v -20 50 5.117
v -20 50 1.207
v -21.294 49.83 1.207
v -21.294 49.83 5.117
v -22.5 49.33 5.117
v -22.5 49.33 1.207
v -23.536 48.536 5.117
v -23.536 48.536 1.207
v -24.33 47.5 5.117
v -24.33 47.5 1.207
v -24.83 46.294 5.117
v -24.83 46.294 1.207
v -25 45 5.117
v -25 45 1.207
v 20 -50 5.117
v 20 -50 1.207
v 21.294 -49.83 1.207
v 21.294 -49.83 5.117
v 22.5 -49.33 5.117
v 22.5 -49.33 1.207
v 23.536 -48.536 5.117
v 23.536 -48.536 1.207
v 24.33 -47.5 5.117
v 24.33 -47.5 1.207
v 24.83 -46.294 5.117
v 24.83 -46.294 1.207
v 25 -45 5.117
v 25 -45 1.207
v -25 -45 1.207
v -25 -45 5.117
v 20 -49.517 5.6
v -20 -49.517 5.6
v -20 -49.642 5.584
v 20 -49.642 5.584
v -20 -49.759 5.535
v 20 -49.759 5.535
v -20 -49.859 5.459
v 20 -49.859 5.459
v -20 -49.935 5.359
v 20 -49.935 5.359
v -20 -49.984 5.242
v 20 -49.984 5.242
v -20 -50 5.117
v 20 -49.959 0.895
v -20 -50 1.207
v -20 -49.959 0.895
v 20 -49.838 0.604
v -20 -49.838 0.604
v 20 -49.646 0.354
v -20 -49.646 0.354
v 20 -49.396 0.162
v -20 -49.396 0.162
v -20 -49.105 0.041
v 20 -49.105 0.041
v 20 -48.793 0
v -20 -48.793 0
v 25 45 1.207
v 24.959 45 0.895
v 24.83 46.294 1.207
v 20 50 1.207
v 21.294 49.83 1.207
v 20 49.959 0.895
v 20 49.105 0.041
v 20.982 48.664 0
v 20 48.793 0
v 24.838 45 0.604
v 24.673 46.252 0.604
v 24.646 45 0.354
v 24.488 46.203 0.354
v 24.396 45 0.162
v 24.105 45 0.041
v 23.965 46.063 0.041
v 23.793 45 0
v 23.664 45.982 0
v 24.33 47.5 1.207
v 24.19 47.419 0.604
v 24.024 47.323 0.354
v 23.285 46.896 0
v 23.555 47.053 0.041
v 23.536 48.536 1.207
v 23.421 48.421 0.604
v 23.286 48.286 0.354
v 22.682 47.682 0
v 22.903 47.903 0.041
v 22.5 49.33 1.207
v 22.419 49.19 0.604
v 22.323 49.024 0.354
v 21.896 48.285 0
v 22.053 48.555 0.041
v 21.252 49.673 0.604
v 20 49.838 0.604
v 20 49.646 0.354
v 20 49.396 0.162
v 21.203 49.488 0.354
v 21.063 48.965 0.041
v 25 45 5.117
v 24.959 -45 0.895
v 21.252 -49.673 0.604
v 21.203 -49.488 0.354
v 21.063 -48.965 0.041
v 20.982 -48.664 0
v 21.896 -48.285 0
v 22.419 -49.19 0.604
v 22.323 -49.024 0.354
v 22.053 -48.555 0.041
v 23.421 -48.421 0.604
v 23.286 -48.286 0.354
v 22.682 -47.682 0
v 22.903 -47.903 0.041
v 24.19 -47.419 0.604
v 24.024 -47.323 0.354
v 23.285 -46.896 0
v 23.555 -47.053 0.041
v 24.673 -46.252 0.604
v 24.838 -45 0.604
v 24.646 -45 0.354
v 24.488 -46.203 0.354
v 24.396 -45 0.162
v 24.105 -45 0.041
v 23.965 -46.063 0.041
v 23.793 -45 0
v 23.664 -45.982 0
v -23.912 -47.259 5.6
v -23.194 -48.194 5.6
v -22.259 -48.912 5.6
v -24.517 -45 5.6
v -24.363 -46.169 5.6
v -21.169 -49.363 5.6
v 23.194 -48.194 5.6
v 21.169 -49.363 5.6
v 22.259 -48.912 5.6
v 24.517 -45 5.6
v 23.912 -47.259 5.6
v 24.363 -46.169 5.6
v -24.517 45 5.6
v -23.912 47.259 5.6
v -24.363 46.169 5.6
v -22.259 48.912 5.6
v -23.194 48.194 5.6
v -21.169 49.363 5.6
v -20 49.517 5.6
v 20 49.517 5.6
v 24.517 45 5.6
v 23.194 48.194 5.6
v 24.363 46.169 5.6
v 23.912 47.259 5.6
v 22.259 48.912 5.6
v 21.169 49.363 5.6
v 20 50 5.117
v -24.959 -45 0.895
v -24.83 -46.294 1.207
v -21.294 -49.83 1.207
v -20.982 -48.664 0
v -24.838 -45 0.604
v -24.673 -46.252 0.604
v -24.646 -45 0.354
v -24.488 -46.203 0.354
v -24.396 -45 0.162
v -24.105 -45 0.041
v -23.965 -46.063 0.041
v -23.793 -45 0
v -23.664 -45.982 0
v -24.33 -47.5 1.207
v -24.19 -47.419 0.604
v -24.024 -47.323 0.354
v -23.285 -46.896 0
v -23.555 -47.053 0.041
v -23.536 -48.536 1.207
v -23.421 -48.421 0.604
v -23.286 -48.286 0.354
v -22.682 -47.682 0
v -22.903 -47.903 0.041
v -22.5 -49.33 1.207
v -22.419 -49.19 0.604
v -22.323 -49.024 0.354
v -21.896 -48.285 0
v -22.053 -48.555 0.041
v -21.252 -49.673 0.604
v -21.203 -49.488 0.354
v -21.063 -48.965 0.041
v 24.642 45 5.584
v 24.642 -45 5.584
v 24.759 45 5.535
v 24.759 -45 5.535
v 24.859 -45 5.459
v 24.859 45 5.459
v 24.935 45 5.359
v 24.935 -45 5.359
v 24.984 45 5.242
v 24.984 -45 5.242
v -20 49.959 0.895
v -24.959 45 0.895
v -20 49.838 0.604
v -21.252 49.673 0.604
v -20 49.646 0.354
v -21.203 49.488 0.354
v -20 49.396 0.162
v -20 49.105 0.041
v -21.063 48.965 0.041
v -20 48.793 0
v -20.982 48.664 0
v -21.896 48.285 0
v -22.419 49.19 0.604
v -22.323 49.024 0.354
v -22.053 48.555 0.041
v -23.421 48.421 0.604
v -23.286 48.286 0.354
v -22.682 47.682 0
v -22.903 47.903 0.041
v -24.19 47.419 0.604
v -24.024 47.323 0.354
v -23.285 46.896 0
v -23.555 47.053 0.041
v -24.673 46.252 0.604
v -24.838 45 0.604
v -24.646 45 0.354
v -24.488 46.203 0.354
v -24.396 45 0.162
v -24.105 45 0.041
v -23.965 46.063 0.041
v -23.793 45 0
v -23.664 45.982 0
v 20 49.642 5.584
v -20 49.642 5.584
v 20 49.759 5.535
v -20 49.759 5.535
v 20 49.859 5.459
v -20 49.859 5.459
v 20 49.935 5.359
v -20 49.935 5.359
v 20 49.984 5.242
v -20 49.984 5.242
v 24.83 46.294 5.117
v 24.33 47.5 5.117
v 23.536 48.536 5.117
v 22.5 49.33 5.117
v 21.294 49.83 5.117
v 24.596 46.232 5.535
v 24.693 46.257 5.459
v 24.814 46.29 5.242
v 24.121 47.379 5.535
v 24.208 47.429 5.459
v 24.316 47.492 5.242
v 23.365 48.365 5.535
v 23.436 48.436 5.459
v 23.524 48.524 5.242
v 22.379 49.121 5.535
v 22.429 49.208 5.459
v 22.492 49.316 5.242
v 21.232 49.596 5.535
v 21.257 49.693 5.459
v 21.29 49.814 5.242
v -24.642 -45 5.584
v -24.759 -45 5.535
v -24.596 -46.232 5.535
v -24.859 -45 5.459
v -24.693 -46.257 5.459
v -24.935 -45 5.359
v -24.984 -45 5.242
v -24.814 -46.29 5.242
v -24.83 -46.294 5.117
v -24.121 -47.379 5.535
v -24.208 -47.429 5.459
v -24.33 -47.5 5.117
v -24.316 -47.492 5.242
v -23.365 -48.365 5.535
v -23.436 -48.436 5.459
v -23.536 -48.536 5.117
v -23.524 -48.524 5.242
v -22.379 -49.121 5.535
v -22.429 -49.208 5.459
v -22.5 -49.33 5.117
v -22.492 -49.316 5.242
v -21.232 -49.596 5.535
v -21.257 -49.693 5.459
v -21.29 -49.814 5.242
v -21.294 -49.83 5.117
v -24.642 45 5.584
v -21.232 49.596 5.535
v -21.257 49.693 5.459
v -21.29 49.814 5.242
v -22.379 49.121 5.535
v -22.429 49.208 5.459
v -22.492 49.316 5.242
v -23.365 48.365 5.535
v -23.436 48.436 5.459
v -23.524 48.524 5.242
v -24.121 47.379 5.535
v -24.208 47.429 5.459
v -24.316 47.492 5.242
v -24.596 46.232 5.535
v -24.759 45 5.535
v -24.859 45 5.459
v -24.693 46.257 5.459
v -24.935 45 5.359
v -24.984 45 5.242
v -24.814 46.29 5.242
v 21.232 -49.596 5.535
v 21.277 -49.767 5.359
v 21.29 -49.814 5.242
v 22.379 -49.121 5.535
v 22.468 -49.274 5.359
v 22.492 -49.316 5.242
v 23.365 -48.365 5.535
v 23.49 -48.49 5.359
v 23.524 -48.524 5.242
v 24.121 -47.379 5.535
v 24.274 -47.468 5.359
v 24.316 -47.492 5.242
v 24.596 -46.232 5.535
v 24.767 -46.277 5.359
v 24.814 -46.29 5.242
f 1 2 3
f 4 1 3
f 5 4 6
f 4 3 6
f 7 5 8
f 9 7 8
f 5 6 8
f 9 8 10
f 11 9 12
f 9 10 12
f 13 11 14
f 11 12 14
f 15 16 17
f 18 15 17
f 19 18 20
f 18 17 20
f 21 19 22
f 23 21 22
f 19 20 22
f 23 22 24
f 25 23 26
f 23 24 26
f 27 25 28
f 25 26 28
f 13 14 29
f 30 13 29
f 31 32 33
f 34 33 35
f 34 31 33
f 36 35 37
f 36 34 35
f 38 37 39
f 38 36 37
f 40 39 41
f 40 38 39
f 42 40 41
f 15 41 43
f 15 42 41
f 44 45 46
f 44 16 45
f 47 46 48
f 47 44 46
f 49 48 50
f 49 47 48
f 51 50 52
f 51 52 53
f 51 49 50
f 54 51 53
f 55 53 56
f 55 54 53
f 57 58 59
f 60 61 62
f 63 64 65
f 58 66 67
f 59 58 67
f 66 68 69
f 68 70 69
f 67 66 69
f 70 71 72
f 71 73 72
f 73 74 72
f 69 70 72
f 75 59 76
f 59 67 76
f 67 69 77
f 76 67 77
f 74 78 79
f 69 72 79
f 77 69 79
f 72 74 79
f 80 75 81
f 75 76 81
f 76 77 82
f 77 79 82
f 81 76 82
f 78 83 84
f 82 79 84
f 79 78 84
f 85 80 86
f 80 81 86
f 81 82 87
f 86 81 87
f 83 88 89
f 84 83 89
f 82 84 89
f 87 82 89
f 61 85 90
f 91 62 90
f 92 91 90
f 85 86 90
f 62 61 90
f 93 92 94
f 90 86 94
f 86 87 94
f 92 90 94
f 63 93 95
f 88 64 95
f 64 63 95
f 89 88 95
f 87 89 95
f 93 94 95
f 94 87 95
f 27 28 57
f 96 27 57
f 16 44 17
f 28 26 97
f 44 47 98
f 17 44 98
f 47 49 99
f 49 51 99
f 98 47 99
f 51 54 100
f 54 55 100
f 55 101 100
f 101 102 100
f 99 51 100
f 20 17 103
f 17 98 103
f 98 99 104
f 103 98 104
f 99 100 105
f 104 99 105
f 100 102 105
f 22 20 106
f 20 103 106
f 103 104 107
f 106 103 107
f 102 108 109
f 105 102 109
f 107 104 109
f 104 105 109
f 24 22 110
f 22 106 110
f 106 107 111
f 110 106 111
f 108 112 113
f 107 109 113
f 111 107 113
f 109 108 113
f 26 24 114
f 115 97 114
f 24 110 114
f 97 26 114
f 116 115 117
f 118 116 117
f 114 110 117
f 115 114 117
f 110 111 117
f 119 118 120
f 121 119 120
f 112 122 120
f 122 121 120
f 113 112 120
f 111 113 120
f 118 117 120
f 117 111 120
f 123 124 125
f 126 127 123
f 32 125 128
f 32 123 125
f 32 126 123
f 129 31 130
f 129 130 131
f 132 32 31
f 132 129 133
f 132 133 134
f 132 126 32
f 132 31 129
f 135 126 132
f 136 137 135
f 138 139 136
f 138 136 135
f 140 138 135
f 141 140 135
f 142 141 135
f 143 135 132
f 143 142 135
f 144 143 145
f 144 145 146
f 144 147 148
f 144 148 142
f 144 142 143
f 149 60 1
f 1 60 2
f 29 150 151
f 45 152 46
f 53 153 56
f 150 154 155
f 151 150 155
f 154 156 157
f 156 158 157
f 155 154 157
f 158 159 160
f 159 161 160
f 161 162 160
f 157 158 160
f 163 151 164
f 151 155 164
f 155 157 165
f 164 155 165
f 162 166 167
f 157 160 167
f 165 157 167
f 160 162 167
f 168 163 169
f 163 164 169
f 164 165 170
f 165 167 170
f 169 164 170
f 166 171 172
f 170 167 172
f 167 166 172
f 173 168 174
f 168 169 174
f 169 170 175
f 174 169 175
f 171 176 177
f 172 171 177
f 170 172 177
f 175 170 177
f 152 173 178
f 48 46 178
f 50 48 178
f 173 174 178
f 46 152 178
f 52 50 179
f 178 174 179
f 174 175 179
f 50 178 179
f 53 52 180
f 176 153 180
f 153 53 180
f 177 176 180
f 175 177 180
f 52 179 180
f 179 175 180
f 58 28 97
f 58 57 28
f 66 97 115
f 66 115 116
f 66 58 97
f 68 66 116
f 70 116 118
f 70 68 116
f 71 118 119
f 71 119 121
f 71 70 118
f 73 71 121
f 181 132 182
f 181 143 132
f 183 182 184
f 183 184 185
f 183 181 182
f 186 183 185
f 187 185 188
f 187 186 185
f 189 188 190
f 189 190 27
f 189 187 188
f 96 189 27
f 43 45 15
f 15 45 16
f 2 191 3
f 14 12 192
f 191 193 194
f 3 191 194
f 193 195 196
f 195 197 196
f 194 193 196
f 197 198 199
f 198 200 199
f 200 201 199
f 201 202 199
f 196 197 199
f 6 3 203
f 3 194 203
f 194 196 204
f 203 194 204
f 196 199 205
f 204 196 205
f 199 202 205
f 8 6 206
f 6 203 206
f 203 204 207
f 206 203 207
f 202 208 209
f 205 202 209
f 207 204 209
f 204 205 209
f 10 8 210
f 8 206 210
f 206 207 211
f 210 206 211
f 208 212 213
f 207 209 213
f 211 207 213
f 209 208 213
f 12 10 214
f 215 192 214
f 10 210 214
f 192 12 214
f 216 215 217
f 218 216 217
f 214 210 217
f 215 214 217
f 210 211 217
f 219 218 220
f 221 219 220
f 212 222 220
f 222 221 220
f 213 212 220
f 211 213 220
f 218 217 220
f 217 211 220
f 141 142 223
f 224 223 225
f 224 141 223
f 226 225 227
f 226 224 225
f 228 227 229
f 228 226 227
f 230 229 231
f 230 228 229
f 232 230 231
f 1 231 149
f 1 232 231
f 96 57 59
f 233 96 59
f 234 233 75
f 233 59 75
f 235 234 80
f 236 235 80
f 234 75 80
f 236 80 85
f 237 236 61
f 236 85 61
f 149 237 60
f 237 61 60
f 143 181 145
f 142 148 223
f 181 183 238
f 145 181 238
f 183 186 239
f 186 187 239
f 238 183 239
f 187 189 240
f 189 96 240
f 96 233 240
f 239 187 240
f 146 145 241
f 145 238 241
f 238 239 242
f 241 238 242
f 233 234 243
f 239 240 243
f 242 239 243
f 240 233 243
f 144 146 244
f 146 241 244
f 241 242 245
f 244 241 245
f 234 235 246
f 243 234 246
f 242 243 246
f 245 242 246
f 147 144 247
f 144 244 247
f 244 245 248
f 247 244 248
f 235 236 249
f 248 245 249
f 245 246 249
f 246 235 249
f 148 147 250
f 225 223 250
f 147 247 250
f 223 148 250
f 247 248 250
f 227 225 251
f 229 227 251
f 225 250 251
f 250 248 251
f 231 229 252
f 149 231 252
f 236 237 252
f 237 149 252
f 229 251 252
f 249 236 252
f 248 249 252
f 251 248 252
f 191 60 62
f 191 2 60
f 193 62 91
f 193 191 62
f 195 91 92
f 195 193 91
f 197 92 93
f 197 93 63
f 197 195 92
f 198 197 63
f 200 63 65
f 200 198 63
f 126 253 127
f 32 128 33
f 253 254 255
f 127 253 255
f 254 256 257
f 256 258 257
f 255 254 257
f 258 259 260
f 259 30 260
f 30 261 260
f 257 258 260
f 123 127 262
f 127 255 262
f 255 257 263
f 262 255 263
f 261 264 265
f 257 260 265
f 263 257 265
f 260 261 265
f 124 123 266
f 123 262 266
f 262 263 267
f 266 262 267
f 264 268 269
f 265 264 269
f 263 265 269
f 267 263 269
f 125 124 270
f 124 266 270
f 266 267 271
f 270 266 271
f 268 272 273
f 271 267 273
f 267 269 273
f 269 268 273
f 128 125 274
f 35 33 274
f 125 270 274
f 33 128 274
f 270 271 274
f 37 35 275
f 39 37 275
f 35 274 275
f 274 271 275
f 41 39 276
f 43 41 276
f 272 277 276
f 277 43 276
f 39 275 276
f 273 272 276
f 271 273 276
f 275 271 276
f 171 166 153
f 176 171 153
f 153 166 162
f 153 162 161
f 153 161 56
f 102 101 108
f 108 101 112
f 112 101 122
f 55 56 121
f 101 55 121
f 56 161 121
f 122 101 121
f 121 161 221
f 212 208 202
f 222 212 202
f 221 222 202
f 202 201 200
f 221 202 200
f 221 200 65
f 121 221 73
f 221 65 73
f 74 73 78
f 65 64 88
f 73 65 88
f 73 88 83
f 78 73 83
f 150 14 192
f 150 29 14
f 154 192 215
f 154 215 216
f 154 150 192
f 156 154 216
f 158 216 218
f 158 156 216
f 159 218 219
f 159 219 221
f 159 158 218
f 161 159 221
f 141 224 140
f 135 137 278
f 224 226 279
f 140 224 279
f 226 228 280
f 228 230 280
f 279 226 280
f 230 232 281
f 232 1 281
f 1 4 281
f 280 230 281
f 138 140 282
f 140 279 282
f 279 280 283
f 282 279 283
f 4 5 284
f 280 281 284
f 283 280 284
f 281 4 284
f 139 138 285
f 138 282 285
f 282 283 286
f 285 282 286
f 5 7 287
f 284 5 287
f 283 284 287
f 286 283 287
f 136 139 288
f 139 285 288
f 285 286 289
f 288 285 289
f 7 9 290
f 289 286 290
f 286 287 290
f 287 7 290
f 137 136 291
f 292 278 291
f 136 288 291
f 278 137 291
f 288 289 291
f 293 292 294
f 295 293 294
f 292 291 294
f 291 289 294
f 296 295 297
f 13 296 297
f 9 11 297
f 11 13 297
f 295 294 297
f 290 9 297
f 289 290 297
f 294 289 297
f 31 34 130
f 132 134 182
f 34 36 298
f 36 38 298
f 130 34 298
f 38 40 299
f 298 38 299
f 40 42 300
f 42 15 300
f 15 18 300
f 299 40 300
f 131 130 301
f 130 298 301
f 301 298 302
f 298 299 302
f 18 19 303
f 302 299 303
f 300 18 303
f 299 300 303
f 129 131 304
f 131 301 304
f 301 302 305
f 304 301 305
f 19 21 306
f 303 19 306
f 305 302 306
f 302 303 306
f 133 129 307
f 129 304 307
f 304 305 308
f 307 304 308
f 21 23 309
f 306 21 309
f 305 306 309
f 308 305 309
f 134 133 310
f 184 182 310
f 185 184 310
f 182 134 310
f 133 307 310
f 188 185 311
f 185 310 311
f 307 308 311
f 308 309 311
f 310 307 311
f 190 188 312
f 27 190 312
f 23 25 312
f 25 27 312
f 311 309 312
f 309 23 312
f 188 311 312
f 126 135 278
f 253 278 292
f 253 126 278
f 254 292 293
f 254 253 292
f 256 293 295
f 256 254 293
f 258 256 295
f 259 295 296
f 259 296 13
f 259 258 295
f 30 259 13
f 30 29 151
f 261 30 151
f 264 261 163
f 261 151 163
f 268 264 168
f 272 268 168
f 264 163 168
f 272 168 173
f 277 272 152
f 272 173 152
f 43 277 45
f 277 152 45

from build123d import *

# Parameters (mm, degrees)
F1_DEPTH = 5.6
F2_R     = 1.207107
F3_R     = 0.482843


with BuildPart() as f1:
    # F0 (on Top) → F1 (new body)
    with BuildSketch(Plane.XY):
        with BuildLine():
            Line((20, 50), (-20, 50))
            ThreePointArc((-20, 50), (-23.535534, 48.535534), (-25, 45))
            Line((-25, 45), (-25, -45))
            ThreePointArc((-25, -45), (-23.535534, -48.535534), (-20, -50))
            Line((-20, -50), (20, -50))
            ThreePointArc((20, -50), (23.535534, -48.535534), (25, -45))
            Line((25, -45), (25, 45))
            ThreePointArc((25, 45), (23.535534, 48.535534), (20, 50))
        make_face()
    extrude(amount=F1_DEPTH)

    # F2
    f2_edges = [f1.edges().sort_by_distance(p)[0] for p in [
        (-25, 0, 0),
    ]]
    fillet(f2_edges, radius=F2_R)

    # F3
    f3_edges = [f1.edges().sort_by_distance(p)[0] for p in [
        (25, 0, 5.6),
    ]]
    fillet(f3_edges, radius=F3_R)


solid = f1.part
